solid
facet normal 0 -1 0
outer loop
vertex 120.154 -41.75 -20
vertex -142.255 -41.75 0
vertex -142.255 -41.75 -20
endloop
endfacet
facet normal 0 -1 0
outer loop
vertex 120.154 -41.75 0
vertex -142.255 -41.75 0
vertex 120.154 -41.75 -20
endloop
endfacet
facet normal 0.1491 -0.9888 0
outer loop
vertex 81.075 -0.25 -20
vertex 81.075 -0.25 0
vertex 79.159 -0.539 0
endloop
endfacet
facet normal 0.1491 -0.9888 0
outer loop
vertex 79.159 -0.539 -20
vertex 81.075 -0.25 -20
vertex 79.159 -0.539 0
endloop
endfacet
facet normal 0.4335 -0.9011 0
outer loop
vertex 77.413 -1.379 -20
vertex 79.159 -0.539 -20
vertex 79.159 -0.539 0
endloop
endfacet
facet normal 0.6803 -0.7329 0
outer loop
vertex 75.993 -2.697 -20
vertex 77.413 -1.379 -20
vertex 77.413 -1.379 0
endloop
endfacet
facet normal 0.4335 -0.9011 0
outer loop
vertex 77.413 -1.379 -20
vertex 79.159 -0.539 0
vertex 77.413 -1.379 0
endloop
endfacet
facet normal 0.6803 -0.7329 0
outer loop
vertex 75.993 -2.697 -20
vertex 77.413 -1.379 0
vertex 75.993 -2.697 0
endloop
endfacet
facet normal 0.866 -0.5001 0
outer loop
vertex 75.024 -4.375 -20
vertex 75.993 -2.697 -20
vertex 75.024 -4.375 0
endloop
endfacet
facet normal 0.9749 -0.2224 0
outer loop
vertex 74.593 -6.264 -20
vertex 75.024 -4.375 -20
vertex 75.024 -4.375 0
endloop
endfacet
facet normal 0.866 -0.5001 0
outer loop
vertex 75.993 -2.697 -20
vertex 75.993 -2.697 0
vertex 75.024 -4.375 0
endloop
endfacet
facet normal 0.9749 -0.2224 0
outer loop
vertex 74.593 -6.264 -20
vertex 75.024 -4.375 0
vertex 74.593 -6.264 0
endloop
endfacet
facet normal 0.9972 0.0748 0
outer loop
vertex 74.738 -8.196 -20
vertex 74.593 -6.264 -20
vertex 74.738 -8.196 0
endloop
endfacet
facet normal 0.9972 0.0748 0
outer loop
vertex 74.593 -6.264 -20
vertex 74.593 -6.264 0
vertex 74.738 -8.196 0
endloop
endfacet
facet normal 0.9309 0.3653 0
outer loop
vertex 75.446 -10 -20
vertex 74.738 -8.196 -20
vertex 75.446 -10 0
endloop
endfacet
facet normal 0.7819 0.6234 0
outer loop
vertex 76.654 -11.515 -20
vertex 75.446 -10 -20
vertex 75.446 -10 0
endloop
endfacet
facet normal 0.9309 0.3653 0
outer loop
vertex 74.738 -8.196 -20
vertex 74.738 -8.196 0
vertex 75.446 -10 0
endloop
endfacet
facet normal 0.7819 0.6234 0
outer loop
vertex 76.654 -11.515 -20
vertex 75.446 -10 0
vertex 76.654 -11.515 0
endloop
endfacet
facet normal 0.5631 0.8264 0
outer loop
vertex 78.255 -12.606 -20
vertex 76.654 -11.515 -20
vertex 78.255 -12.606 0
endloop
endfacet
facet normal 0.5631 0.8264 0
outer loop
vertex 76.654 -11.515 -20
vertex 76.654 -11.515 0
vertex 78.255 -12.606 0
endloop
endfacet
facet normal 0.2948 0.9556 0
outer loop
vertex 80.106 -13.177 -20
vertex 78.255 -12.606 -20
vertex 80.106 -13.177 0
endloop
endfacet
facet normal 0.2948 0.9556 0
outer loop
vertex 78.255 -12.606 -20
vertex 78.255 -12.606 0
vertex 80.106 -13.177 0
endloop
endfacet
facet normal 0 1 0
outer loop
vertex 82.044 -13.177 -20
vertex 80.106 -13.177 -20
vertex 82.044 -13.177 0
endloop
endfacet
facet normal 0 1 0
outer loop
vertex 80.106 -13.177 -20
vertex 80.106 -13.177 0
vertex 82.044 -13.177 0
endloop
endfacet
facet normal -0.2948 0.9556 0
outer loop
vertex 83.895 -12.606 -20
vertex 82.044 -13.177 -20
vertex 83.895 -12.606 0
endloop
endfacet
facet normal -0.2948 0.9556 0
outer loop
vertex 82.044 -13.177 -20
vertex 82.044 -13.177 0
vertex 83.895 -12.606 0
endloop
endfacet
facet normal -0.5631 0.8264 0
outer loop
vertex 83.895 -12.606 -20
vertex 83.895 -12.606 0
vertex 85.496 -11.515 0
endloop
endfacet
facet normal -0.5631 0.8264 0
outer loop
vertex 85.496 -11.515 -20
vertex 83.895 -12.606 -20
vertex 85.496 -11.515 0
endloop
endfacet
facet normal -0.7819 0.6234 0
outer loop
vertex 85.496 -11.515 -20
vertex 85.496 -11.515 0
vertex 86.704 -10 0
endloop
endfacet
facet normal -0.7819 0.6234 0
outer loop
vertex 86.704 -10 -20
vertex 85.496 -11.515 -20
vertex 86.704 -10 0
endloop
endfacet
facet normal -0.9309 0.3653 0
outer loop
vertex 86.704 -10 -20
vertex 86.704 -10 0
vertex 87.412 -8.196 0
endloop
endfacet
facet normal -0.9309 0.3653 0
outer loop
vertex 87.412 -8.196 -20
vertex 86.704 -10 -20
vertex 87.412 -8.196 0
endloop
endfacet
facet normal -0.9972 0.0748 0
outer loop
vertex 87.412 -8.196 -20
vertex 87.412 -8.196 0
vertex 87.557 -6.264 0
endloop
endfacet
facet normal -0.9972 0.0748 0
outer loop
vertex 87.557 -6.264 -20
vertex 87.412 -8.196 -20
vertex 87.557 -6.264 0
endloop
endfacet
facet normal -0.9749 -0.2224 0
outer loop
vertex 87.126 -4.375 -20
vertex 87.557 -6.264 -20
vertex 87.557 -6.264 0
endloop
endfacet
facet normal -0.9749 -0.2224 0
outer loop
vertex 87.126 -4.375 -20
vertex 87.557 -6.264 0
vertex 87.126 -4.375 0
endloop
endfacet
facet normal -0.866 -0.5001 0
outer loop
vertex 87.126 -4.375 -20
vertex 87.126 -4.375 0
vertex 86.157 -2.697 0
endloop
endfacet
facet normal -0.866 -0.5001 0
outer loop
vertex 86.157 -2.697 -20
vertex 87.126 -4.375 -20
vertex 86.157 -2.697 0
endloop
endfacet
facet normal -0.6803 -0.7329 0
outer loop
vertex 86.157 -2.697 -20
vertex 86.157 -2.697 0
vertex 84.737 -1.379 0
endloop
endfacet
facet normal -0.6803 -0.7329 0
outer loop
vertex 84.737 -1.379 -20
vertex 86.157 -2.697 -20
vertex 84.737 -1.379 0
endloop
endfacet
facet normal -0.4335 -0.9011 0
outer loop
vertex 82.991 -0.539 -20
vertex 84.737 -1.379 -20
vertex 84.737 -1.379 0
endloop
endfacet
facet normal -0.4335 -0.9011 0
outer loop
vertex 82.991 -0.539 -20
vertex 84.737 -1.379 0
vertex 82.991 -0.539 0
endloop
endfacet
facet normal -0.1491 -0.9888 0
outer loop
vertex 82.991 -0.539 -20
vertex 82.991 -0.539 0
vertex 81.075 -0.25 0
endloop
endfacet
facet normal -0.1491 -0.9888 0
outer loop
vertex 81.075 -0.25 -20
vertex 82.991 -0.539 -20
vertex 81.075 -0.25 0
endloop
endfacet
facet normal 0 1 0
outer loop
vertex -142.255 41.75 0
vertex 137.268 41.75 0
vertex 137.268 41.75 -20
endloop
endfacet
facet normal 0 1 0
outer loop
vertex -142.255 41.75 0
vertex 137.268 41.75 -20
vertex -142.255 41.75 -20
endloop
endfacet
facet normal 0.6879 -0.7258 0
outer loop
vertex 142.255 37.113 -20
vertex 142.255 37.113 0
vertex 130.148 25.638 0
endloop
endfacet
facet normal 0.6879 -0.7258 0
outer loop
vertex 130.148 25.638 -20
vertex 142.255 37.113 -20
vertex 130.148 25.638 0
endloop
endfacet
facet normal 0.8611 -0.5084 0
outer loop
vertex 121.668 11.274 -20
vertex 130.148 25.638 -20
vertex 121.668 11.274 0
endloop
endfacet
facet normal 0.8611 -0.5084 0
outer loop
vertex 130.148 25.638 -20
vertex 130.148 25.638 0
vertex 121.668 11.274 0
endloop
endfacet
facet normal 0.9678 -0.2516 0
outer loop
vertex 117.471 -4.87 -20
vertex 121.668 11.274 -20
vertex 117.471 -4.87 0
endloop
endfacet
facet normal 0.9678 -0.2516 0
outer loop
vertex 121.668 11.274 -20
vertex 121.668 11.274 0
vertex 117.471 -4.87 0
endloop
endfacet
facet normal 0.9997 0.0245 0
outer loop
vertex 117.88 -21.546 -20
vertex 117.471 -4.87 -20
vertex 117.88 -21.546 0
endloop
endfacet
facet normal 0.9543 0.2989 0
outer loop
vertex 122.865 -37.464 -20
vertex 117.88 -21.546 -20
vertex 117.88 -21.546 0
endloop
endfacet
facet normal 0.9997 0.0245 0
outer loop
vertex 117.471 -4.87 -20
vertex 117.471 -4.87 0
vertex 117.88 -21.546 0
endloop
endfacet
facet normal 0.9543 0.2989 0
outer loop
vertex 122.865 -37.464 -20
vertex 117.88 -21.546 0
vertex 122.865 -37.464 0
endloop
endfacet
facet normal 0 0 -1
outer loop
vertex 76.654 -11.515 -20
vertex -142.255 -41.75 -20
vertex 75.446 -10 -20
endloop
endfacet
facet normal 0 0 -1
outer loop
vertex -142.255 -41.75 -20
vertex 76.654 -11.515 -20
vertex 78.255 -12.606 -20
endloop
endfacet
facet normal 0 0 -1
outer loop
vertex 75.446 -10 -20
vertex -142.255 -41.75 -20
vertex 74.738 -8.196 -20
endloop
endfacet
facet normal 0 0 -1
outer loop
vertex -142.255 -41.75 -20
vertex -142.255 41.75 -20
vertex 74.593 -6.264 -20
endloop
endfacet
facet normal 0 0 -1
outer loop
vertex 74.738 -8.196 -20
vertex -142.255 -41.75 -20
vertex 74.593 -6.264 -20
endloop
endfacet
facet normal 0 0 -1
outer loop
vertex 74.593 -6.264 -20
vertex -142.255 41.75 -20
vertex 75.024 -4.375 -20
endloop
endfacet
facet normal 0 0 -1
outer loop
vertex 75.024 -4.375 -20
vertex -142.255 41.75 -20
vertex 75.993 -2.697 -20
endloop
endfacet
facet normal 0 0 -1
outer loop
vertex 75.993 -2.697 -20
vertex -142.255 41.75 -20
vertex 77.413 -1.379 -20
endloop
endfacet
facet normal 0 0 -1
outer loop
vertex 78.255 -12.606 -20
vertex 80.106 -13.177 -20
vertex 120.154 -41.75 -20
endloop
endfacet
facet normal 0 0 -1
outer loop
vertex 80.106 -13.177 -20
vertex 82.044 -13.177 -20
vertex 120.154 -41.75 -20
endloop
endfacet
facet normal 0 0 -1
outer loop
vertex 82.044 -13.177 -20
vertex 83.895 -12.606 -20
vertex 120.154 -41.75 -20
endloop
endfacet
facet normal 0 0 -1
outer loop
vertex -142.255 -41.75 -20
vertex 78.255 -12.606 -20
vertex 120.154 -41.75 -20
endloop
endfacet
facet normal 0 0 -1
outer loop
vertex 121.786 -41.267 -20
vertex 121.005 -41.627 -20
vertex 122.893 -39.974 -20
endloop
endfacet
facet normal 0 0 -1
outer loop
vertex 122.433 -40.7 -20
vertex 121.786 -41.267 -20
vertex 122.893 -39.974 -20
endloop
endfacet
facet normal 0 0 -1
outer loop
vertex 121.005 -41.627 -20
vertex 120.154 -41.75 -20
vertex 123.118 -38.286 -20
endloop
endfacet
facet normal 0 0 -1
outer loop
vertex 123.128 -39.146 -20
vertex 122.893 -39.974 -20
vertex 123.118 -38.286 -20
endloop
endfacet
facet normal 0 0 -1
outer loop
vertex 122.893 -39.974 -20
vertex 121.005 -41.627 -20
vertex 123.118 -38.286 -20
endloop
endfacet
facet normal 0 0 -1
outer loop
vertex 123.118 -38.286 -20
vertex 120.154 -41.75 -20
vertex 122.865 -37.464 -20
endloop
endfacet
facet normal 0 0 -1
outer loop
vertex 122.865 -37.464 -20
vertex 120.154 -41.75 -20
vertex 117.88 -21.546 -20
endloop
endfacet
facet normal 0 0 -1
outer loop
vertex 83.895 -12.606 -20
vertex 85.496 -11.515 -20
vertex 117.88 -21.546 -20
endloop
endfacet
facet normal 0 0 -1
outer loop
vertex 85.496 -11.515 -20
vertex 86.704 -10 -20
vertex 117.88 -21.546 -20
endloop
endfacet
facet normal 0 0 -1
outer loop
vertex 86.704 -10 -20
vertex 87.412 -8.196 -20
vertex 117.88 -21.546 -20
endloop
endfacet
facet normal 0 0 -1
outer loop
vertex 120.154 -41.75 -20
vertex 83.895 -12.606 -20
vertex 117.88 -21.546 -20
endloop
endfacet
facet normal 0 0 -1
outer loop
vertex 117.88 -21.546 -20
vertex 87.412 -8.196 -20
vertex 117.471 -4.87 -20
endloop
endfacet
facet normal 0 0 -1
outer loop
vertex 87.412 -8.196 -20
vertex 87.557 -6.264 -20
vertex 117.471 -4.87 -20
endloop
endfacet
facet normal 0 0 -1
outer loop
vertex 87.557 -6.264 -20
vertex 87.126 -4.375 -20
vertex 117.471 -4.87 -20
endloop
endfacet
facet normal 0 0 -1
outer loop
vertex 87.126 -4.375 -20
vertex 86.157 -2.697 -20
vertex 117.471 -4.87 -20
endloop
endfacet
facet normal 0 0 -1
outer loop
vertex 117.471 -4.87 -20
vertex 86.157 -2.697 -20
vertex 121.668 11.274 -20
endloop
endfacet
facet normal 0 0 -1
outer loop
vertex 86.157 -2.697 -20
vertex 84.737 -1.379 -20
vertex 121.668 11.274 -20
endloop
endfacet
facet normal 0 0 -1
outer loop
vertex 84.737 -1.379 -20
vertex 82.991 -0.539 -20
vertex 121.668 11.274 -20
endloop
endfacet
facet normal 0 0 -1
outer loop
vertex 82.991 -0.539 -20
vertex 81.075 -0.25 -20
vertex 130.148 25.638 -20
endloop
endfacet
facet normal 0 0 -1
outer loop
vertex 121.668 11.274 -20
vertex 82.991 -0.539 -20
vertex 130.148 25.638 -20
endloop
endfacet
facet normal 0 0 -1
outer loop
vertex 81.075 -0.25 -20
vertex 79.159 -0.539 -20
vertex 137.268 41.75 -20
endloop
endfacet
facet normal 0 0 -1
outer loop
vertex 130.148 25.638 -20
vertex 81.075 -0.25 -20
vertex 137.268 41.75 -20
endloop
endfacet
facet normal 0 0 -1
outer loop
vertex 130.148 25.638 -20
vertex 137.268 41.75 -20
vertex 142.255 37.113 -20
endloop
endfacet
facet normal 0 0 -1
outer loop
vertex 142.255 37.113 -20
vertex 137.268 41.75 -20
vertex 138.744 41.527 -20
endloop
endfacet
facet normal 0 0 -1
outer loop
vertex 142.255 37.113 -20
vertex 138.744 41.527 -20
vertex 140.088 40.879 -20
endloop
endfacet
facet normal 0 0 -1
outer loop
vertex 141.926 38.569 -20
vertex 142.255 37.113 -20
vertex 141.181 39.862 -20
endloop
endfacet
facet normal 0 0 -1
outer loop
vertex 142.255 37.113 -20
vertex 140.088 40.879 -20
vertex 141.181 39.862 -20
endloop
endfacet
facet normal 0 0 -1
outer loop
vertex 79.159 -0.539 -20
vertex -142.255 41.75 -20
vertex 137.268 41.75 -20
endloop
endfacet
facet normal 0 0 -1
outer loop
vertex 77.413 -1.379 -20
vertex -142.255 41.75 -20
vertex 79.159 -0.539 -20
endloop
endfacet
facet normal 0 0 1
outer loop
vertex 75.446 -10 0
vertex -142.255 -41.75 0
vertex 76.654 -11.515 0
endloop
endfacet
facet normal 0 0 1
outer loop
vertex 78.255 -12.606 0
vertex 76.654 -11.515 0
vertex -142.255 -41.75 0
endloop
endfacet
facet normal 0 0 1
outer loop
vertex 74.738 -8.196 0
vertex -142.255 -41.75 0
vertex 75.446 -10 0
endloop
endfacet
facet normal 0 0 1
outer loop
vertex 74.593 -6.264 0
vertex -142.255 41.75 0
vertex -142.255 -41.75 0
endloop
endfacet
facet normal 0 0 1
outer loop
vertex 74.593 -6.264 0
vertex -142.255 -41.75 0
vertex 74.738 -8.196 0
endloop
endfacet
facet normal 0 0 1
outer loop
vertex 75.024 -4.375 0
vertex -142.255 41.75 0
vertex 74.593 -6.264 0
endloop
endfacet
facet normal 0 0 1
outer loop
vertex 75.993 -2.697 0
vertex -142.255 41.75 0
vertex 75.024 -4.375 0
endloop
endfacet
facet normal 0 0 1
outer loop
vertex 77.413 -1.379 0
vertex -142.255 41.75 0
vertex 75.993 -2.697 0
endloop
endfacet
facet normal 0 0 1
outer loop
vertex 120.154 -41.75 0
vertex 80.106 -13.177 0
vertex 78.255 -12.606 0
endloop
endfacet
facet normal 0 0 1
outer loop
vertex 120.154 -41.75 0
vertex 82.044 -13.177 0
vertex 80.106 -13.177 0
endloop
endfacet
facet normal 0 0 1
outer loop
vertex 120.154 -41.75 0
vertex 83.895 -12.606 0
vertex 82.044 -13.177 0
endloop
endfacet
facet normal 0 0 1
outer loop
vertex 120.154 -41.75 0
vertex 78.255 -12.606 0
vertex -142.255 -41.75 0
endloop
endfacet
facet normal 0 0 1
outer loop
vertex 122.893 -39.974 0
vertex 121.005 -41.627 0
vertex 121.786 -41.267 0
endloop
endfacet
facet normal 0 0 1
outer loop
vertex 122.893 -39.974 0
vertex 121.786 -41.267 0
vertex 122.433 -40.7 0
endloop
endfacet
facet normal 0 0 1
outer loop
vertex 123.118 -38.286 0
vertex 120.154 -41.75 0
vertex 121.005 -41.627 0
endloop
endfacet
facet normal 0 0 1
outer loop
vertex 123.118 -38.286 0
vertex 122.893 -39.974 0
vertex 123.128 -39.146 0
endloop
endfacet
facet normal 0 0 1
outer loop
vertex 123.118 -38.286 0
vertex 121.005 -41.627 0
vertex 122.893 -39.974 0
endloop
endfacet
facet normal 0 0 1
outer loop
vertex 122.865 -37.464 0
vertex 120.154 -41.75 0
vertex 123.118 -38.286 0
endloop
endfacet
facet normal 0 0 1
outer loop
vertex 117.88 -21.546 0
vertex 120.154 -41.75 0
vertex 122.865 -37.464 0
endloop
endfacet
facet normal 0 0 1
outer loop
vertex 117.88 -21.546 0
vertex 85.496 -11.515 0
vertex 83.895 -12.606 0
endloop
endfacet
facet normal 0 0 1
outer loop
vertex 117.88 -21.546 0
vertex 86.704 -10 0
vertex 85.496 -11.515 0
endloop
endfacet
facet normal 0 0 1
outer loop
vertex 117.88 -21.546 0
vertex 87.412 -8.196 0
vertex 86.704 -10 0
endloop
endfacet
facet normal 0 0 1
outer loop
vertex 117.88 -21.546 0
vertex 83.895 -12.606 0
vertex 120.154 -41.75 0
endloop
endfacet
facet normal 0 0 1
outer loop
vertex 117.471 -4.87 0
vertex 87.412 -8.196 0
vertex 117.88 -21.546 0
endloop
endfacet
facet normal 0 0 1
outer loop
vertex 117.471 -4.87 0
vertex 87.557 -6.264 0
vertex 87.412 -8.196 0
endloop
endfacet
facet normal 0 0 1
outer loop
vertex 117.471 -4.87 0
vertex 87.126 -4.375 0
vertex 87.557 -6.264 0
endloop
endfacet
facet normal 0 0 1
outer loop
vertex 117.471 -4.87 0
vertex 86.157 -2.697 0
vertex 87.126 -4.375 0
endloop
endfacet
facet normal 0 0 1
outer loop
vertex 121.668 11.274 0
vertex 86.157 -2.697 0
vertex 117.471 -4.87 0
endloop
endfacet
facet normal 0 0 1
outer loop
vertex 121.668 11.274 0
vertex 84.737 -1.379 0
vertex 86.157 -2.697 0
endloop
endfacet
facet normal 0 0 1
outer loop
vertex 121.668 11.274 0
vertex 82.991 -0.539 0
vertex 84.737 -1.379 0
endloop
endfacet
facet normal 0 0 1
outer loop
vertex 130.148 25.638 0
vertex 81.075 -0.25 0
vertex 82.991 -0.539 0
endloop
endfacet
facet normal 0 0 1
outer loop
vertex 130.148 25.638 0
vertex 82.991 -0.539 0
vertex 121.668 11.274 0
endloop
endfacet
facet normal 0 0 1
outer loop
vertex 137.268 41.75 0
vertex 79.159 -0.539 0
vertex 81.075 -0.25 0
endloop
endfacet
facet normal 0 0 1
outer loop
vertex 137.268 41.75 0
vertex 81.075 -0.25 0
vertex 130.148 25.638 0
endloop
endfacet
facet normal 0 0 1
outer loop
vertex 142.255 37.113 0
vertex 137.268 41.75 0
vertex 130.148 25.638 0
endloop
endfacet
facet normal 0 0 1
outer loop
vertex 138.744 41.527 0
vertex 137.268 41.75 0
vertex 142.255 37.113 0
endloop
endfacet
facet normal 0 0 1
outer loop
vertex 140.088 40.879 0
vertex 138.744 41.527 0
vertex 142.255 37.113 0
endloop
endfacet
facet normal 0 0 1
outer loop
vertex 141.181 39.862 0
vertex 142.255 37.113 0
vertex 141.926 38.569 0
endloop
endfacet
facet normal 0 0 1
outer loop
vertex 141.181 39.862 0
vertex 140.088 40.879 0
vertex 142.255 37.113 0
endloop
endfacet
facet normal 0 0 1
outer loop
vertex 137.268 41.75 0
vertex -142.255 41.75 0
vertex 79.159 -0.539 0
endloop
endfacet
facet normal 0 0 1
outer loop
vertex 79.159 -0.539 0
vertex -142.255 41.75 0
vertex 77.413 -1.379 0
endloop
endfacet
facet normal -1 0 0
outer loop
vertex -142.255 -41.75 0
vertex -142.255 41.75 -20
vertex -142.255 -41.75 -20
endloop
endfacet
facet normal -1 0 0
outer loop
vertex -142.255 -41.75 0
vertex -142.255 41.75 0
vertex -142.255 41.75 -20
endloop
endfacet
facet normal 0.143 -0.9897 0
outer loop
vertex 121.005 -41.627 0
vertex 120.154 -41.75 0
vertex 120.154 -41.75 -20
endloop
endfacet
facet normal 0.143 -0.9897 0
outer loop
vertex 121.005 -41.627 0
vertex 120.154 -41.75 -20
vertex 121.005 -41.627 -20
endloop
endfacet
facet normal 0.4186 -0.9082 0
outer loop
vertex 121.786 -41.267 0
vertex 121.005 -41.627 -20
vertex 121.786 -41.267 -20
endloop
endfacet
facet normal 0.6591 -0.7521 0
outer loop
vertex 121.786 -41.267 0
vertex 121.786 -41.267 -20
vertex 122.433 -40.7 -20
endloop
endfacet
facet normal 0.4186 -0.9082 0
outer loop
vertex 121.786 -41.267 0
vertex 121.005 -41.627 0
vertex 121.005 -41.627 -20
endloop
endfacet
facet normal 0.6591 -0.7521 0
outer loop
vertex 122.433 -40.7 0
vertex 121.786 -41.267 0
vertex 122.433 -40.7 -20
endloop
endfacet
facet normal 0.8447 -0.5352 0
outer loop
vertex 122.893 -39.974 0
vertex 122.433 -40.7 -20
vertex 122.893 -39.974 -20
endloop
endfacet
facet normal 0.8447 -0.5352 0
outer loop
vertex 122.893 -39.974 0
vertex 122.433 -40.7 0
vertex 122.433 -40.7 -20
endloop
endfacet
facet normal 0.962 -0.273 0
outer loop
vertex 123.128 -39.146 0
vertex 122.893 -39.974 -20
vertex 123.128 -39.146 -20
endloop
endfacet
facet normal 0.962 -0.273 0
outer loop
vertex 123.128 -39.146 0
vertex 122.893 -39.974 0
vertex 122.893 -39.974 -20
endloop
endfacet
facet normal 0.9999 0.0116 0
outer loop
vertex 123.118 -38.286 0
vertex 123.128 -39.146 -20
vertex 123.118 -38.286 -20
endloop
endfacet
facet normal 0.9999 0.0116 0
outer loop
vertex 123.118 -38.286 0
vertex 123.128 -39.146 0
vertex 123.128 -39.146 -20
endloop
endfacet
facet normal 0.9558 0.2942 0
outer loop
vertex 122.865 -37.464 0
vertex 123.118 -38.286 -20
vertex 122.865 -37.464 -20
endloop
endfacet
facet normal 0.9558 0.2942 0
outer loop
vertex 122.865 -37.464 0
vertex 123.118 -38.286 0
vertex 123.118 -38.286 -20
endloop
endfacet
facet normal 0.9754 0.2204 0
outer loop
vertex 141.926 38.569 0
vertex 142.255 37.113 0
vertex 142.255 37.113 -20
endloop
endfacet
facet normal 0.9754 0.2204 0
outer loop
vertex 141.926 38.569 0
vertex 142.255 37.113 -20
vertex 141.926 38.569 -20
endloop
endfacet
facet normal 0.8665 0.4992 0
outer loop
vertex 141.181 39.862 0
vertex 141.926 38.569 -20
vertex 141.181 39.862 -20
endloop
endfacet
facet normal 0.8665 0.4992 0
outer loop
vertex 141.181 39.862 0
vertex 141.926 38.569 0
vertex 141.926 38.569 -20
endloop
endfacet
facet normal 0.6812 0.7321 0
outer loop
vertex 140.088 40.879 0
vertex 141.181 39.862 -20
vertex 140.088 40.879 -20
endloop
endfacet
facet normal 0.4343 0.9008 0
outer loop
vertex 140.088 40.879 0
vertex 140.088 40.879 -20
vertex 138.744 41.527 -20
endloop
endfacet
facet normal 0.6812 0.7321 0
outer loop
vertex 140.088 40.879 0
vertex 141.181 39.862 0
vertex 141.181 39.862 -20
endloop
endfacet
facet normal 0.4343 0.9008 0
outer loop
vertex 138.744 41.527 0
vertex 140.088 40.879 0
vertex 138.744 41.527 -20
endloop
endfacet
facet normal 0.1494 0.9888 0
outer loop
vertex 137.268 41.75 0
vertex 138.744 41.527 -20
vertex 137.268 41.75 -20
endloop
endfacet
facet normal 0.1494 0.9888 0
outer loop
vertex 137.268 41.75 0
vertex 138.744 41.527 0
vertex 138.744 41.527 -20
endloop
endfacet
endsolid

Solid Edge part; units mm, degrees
sketch "Sketch1" plane through (0, 0, 0) normal (0, 0, 1) x (1, 0, 0)
  line L0 (-142.255, -41.75) -> (142.255, -41.75)
  line L1 (142.255, -41.75) -> (142.255, 41.75)
  line L2 (142.255, 41.75) -> (-142.255, 41.75)
  line L3 (-142.255, 41.75) -> (-142.255, -41.75)
extrude "Protrusion1" add sketch "Sketch1" against normal blind 20
sketch "Sketch2" plane through (0, 0, 0) normal (0, 0, 1) x (0, 1, 0)
  circle A0 centre (-6.75, -81.075) radius 6.5
  circle A1 centre (-11.75, -177.075) radius 60
extrude "ExtrudedCutout_1" cut sketch "Sketch2" against normal blind 20
fillet "Round_2" radius 3 1 edges at (125.1135, -41.75, -10)
fillet "Round_3" radius 5 1 edges at (142.255, 41.75, -10)
